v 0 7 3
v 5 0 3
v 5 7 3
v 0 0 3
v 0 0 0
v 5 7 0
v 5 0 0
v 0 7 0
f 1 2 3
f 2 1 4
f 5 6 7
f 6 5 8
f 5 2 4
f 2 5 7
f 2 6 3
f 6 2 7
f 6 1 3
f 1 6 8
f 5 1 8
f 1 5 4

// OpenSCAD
// Generated by SolidPython 1.0.1 on 2020-07-29 00:46:54


cube(size = [5, 7, 3]);
/***********************************************
*********      SolidPython code:      **********
************************************************
 
# import packages: SolidPython
from solid import *
from solid.utils import *
from itertools import chain, combinations, permutations


class Resize:

    def __init__(self, scad_file):
        self.scad_file = scad_file
        #self.scad_file = import_scad(scad_file)
        # cone/cylinder param:
        self.r1 = 0
        self.r2 = 0
        self.h = 0
        # rectangular prism param:
        self.w = 0
        self.l = 0
        # ellipse param:
        self.r = 0

    # import OpenScad code (file name corresponds to shape)


    # classify shape + parameters
    def assign(self, param1, param2, param3):
        if self.scad_file == 'cone.scad':
            self.r1 = param1
            self.r2 = param2
            self.h = param3
        elif self.scad_file == 'cylinder.scad':
            self.r1 = param1
            self.r2 = param2
            self.h = param3
        elif self.scad_file == 'rectangularPrism.scad':
            self.h = param1
            self.l = param2
            self.w = param3
        else:
            self.r = param1
            self.h = param2

    # resize parameters
    def iterate(self):
        x = range(3, 20, 2)
        i = 1
        if self.scad_file == 'cone.scad':
            tempList = list(permutations(x, 2))
            for temp in tempList:
                param1 = temp[0]
                param2 = temp[1]
                filepath = 'produced_scad_files/' + 'cone' + str(param1) + '_' + str(param2) + '_' + '.scad'
                scad_render_to_file(cylinder(h=param1, r1=param2, r2=0), filepath)

        elif self.scad_file == 'cylinder.scad':
            tempList = list(permutations(x, 3))
            for temp in tempList:
                param1 = temp[0]
                param2 = temp[1]
                filepath = 'produced_scad_files/' + 'cylinder' + str(param1) + '_' + str(param2) + '_' + '.scad'
                scad_render_to_file(cylinder(h=param1, r1=param2, r2=param2), filepath)

        elif self.scad_file == 'rectangularPrism.scad':
            tempList = list(permutations(x, 3))
            for temp in tempList:
                param1 = temp[0]
                param2 = temp[1]
                param3 = temp[2]
                filepath = 'produced_scad_files/' + 'rectangularPrism' + str(param1) + '_' + str(param2) + '_' + str(
                    param3) + '.scad'
                scad_render_to_file(cube(size=(param1, param2, param3)), filepath)

        elif self.scad_file == 'ellipse.scad':
            tempList = list(permutations(x, 4))
            for temp in tempList:
                param1 = temp[0]
                param2 = temp[1]
                param3 = temp[2]
                param4 = temp[3]
                filepath = 'produced_scad_files/' + 'ellipse' + str(param1) + '_' + str(param2) + '_' + str(param3) + '_' + str(param4) + '.scad'
                scad_render_to_file(scale([param1, param2, param3])(sphere(r=param4)), filepath)

    def render_to_scadfile(self):
        scad_render_to_file(scad, 'example.scad') 
 
************************************************/
